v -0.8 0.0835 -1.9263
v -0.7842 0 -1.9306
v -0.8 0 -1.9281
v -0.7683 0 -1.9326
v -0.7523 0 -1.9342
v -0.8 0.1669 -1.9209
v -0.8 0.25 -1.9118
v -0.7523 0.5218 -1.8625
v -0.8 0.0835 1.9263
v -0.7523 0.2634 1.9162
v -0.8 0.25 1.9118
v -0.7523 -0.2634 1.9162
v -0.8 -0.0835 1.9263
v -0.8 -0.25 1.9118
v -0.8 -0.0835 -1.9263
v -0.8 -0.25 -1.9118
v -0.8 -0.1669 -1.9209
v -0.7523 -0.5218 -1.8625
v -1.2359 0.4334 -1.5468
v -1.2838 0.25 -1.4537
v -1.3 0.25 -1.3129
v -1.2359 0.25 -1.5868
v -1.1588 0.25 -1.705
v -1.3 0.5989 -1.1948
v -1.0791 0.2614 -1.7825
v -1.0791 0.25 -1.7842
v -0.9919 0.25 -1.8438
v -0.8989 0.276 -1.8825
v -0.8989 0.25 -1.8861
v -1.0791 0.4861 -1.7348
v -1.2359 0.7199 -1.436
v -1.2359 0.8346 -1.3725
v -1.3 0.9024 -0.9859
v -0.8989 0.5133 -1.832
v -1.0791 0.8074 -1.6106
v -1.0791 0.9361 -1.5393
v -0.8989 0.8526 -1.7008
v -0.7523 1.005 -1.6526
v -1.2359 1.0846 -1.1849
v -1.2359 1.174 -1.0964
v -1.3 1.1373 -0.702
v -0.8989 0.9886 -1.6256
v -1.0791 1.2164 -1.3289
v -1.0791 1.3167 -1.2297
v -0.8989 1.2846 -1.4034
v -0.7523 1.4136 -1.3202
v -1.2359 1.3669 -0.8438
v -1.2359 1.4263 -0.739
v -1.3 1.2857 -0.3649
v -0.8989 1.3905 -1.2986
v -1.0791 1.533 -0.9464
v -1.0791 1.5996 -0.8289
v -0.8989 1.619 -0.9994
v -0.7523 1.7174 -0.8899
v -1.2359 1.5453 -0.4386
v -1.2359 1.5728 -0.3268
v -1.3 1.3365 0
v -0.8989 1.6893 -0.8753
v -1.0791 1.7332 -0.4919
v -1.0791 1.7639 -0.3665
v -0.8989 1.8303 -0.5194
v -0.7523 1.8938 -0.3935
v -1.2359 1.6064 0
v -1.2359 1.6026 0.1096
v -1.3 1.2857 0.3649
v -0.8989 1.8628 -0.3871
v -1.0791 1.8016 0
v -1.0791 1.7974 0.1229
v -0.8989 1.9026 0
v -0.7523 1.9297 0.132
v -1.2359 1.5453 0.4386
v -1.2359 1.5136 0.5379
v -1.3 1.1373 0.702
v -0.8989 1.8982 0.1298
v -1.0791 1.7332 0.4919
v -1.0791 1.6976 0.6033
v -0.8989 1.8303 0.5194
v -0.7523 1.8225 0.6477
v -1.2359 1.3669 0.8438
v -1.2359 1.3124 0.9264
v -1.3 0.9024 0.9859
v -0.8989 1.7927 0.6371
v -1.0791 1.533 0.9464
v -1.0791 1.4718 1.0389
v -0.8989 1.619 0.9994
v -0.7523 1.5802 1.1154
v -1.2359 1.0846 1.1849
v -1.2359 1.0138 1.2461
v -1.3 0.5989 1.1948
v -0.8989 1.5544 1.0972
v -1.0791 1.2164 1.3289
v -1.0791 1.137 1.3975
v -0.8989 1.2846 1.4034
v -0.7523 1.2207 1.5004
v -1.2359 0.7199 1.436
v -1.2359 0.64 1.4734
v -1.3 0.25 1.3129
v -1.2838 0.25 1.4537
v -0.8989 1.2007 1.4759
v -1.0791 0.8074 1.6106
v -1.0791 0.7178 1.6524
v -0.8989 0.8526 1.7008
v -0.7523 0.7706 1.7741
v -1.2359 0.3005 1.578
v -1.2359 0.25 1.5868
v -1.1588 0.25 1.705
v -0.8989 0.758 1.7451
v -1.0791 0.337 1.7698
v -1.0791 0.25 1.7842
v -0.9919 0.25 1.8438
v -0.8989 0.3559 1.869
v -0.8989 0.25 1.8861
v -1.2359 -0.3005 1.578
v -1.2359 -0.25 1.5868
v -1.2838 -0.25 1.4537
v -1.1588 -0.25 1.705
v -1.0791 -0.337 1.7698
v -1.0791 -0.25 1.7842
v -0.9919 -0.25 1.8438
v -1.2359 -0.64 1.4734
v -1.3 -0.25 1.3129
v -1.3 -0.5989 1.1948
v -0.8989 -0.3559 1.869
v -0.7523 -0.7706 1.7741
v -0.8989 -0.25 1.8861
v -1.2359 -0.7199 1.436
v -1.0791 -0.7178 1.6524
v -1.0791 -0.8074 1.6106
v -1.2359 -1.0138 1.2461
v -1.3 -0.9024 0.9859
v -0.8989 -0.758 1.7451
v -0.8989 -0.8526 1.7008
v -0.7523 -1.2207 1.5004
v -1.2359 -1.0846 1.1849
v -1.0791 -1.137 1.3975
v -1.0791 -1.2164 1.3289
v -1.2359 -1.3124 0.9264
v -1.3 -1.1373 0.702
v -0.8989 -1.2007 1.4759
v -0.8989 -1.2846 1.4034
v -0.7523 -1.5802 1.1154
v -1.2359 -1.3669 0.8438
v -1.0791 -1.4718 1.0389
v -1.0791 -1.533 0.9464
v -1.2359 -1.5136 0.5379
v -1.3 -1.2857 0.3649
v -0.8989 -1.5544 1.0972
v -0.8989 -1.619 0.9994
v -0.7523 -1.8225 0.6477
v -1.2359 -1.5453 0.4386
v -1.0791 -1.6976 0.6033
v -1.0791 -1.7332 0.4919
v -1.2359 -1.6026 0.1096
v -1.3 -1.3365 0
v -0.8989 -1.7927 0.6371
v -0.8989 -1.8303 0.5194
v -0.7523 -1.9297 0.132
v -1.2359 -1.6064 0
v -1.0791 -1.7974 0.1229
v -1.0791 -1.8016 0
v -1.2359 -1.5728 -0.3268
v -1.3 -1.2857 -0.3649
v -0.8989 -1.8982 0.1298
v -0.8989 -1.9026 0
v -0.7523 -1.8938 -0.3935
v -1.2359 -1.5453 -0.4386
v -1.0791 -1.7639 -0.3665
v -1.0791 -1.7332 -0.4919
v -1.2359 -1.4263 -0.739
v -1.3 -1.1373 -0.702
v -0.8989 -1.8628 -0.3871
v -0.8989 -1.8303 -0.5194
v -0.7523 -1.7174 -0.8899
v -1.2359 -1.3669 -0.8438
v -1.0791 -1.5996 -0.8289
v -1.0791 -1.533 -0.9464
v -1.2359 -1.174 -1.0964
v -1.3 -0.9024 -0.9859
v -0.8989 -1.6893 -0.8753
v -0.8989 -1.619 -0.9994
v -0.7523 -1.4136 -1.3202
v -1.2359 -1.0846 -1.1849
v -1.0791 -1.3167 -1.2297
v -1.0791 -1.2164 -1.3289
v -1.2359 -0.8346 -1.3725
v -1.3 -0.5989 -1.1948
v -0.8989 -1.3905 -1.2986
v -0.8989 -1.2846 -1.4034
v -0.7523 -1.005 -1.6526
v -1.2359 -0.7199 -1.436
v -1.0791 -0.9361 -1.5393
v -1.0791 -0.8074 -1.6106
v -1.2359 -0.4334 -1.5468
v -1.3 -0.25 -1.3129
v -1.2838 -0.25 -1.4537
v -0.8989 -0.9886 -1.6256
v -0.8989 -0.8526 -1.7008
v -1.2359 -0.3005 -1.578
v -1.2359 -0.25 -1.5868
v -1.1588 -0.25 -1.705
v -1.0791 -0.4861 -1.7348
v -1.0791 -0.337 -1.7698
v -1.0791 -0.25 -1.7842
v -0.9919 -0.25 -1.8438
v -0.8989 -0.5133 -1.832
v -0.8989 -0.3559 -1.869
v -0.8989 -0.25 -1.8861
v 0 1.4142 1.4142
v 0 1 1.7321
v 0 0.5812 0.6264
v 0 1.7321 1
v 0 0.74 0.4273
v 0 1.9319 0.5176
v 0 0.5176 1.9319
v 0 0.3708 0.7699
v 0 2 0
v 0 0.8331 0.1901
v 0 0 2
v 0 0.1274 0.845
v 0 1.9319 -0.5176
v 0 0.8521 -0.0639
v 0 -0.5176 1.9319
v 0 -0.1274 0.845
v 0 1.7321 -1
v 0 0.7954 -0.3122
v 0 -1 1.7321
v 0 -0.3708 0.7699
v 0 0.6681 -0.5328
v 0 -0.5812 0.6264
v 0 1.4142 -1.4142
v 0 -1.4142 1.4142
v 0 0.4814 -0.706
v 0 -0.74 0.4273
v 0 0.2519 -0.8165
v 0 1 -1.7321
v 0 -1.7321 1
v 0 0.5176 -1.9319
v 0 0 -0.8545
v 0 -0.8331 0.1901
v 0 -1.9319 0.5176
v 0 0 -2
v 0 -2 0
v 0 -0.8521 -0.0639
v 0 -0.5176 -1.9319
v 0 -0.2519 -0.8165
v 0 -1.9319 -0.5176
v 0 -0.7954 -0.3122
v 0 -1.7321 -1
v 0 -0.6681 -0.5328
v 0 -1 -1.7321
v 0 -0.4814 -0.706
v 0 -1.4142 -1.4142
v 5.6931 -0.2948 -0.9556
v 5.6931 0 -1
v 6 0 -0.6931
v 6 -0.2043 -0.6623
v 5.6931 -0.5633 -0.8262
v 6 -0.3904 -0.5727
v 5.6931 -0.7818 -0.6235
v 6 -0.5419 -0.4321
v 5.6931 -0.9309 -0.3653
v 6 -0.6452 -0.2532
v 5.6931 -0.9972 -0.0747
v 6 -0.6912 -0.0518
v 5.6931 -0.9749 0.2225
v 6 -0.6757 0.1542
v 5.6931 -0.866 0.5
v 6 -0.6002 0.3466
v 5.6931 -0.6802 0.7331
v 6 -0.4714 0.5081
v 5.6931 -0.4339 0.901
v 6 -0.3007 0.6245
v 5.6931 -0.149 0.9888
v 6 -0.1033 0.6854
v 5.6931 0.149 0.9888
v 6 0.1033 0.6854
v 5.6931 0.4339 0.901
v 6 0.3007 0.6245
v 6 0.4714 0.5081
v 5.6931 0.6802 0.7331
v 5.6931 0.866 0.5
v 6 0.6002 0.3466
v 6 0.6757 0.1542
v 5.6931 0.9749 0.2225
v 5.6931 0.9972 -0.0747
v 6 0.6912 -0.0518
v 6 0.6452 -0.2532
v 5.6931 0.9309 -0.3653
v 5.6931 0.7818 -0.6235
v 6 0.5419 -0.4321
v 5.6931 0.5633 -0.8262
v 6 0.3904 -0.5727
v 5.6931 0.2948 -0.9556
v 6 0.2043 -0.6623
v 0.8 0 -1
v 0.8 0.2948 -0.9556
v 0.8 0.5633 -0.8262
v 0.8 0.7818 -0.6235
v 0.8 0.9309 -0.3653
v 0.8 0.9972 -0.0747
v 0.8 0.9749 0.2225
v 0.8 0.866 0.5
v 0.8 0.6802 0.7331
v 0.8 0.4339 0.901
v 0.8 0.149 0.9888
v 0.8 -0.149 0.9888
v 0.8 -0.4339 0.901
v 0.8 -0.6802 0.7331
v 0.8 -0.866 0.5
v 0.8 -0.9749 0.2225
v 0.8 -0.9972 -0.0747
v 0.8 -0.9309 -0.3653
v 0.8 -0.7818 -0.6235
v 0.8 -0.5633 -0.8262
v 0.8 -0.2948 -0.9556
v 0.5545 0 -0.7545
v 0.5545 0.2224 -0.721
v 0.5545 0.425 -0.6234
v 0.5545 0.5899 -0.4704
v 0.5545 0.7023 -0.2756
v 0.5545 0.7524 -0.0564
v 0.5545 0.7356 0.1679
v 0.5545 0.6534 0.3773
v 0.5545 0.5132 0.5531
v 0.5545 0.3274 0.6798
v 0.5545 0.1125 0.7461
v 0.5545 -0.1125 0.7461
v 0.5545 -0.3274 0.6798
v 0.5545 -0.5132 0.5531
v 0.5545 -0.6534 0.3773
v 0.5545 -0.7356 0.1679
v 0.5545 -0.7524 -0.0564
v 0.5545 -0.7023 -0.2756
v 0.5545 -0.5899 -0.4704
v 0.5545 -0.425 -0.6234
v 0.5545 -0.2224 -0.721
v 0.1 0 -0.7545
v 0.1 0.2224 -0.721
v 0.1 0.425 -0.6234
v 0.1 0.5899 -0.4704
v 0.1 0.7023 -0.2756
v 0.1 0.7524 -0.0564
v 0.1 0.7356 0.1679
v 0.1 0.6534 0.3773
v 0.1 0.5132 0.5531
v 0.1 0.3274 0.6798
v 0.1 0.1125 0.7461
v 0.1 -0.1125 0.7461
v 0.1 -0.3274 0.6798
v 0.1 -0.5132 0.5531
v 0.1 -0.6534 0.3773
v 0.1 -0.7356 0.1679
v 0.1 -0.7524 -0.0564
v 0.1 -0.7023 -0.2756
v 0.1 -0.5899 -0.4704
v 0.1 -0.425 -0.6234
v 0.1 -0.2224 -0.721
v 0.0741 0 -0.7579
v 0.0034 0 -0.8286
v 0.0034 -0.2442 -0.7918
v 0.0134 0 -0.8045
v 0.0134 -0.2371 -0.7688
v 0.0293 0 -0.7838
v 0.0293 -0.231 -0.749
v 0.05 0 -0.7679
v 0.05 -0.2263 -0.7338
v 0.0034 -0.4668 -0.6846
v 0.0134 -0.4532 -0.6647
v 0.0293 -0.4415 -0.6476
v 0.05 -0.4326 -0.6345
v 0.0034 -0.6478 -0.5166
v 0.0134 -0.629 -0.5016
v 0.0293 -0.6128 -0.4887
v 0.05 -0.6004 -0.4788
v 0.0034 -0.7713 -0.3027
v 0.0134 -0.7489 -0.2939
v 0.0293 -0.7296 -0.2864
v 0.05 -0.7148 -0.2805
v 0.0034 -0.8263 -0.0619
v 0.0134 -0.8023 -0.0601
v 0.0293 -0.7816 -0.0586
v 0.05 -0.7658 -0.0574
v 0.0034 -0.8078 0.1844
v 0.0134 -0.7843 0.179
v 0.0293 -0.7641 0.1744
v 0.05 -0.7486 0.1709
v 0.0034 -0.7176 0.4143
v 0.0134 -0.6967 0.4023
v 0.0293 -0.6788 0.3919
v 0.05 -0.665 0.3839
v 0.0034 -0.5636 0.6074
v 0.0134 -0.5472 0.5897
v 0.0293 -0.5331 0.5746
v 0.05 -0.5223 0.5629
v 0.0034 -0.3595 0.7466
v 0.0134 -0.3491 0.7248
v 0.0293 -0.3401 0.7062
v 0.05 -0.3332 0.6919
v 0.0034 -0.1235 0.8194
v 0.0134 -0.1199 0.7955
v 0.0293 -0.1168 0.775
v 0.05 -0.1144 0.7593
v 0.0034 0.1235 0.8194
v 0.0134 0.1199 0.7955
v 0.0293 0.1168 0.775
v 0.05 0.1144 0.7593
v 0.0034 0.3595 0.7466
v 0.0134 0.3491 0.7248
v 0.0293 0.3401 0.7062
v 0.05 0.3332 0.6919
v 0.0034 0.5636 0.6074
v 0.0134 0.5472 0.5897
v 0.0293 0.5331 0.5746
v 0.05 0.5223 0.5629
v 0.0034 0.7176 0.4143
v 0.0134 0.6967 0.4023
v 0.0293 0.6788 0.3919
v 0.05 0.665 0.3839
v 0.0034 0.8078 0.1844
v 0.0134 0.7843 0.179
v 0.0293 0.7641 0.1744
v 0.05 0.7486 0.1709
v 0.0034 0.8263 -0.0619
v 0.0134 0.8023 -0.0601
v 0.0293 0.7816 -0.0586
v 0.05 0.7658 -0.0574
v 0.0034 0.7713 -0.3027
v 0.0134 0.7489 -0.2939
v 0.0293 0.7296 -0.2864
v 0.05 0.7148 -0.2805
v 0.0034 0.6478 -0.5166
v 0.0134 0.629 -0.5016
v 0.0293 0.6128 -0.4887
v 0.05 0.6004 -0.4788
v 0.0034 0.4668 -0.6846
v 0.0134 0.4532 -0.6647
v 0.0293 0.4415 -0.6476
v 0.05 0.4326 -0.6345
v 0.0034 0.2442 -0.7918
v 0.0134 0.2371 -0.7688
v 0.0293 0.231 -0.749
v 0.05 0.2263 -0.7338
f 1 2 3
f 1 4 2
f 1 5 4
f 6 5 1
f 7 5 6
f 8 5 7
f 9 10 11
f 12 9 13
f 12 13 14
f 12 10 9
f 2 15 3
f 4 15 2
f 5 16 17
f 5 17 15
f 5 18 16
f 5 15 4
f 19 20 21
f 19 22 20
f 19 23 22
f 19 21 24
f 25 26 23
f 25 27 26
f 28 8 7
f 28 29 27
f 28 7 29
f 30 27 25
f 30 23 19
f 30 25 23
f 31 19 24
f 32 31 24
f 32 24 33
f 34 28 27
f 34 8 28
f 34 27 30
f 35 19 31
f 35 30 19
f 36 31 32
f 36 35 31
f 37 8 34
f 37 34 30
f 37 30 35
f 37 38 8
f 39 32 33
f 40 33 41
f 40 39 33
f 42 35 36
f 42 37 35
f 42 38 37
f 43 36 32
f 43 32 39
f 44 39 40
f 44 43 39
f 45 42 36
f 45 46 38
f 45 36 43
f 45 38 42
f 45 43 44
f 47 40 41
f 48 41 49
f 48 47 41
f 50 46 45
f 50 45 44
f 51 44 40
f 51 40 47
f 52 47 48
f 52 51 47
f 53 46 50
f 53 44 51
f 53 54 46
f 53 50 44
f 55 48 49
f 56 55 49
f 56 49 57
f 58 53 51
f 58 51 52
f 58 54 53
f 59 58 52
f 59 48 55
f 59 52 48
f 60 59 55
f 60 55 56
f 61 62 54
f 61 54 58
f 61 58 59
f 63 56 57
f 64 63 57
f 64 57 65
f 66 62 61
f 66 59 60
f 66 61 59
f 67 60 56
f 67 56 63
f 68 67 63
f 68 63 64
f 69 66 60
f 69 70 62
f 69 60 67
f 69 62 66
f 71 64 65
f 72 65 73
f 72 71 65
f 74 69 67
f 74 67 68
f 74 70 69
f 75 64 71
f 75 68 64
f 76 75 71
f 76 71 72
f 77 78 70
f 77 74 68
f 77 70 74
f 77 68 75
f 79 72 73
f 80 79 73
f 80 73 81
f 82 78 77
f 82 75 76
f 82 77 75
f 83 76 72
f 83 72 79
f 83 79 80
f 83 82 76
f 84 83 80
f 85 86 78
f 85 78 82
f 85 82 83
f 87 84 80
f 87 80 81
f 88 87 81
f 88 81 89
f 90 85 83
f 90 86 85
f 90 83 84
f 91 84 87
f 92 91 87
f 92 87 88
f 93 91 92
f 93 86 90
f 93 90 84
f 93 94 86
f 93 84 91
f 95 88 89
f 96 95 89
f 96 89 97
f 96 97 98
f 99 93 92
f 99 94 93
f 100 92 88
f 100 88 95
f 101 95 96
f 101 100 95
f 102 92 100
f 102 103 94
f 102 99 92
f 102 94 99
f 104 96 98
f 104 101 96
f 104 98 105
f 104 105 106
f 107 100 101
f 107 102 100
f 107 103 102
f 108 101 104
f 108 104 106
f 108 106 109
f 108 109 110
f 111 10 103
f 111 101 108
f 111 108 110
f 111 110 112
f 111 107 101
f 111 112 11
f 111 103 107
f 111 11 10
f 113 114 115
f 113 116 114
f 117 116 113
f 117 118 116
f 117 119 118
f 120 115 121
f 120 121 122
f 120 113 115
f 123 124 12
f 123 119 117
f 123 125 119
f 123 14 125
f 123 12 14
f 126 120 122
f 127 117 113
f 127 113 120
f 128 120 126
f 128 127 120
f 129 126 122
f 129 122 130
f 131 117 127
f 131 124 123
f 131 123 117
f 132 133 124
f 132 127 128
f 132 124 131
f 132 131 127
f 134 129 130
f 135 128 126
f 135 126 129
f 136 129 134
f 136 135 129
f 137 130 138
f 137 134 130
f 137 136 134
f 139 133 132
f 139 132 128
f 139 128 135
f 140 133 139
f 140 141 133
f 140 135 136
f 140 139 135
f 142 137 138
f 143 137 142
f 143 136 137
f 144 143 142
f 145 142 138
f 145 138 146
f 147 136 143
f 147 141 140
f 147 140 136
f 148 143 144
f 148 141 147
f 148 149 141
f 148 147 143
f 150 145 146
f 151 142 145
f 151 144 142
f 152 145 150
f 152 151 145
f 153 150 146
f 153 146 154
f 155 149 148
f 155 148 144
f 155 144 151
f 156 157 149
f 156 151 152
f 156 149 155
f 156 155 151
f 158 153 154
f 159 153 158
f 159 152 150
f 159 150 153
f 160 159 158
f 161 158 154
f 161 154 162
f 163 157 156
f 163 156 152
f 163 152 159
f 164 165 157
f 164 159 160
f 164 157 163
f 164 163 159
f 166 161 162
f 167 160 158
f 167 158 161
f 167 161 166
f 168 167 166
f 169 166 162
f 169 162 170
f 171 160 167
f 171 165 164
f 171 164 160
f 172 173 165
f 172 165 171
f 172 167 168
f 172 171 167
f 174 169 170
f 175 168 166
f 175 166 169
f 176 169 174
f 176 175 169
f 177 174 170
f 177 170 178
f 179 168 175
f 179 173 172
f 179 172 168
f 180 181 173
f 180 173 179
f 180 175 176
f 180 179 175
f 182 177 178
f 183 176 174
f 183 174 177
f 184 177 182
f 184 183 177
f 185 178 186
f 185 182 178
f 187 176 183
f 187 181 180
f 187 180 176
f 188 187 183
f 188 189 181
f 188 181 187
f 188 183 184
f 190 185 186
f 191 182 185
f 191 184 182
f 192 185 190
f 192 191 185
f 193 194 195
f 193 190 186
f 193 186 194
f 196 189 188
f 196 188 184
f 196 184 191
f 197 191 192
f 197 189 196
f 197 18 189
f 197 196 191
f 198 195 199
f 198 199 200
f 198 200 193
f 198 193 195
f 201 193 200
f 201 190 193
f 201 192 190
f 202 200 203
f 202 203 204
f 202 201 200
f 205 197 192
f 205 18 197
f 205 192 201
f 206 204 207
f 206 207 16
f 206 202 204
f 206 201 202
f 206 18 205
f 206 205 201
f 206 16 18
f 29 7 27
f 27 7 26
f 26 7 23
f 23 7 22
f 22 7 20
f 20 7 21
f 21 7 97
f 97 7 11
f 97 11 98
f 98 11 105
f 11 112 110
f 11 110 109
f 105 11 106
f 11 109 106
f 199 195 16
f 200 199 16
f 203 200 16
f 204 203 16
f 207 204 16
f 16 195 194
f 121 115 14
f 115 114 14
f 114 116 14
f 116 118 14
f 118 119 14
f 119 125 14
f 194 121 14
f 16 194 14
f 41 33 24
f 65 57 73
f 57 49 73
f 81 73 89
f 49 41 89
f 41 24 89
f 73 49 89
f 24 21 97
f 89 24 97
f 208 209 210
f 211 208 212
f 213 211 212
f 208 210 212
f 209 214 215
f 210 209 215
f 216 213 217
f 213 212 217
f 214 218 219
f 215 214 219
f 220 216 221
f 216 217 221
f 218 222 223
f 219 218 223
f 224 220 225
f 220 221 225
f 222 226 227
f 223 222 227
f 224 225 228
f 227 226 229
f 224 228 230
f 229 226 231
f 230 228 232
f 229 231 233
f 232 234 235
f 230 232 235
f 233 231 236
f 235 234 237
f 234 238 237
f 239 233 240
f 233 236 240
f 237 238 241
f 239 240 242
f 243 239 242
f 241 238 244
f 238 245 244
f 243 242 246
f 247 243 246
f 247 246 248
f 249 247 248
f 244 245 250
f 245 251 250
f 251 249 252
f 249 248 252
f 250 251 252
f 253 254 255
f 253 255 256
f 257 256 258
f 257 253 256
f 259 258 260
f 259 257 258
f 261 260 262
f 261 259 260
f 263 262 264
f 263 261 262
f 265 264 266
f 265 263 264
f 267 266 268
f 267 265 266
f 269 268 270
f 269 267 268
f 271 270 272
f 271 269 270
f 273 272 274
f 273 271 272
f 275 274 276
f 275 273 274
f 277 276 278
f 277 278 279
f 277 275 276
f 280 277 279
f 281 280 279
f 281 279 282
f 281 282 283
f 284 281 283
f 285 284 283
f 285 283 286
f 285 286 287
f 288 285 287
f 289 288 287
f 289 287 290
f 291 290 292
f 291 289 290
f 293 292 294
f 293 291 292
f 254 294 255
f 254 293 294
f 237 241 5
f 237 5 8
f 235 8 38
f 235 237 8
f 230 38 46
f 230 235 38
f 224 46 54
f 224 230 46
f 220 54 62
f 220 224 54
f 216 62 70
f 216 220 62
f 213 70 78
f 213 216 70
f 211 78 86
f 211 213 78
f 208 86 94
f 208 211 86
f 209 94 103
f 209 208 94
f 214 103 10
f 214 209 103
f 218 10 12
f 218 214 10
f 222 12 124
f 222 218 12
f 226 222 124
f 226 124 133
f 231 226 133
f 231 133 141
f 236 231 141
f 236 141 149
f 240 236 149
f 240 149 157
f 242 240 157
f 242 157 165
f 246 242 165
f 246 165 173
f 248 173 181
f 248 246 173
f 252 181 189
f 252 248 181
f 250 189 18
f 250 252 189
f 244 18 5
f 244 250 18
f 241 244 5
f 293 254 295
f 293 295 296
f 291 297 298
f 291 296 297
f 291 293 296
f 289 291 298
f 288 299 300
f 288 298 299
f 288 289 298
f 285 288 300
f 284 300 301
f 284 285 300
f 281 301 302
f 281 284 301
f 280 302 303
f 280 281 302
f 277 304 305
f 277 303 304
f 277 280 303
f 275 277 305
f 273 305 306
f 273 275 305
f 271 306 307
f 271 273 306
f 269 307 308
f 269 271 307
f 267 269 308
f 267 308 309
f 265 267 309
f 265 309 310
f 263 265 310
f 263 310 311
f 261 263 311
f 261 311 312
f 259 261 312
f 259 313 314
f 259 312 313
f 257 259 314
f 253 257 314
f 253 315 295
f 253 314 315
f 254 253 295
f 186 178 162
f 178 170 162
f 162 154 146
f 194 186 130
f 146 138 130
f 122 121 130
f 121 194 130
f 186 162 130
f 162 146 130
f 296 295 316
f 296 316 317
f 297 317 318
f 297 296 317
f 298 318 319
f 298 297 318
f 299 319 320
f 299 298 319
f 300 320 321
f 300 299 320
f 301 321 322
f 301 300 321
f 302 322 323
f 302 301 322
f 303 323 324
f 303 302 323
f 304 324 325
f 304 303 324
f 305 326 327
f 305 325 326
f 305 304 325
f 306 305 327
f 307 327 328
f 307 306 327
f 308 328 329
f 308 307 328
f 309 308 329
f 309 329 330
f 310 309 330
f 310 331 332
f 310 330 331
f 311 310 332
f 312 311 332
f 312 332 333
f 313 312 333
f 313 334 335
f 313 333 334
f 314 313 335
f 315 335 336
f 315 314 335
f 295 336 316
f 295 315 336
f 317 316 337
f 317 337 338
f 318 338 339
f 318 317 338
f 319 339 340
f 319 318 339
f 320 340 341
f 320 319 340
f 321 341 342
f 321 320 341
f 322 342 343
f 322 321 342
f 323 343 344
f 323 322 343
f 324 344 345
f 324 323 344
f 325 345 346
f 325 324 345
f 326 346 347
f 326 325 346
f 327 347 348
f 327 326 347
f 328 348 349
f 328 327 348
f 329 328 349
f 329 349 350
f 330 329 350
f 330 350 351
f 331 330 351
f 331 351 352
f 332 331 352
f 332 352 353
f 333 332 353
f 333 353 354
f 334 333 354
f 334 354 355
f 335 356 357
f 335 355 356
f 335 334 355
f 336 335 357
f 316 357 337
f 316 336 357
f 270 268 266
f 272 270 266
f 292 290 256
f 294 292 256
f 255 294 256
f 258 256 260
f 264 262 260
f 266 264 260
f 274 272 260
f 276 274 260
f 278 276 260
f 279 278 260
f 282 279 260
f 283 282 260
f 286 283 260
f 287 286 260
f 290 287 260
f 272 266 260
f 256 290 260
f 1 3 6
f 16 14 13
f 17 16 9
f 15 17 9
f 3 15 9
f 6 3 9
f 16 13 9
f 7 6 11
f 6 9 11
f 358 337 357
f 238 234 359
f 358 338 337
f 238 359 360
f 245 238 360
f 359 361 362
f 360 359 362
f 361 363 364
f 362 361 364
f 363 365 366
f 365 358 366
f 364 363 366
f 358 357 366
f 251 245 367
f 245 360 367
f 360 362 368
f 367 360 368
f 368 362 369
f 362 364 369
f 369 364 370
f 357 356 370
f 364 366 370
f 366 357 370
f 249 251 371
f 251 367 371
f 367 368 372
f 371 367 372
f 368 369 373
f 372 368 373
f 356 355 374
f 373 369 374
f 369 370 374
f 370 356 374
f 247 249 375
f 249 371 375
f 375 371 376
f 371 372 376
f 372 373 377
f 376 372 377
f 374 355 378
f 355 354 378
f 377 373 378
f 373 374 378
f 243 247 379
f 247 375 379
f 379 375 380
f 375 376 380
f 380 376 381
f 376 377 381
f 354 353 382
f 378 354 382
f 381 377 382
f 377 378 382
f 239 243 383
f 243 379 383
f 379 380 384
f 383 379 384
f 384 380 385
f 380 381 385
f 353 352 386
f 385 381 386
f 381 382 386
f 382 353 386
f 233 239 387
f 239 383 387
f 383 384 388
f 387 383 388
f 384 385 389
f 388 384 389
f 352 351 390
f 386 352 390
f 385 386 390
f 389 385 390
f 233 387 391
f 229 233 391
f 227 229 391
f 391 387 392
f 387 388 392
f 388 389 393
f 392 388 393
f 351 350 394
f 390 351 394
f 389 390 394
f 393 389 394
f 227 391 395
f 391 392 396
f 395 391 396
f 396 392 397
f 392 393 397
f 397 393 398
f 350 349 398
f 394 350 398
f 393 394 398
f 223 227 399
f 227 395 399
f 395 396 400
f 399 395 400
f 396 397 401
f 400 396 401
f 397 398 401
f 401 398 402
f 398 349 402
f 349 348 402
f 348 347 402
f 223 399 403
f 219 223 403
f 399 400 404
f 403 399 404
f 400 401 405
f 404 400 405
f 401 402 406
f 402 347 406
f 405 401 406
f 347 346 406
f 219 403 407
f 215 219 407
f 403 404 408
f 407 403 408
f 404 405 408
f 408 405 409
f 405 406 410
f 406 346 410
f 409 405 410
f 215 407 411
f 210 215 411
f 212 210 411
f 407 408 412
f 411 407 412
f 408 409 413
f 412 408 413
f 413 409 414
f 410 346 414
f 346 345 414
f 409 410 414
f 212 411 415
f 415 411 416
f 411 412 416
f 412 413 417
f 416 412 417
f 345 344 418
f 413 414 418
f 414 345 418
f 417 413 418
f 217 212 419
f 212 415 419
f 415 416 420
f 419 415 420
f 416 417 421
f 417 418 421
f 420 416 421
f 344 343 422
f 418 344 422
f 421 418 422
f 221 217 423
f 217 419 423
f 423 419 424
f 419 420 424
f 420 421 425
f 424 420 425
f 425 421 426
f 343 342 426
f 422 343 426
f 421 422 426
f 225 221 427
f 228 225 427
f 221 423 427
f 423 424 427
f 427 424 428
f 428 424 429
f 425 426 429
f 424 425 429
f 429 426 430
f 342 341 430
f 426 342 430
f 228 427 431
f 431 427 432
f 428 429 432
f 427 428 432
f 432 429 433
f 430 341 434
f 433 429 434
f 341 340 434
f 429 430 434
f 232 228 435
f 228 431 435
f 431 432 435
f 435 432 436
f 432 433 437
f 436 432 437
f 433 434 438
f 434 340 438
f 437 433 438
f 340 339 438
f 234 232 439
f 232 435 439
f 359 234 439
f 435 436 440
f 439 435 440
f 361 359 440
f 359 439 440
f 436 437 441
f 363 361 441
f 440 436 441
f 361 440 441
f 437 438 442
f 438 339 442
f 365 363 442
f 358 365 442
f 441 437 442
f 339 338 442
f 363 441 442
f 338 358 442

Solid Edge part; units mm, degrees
sketch "Sketch1" plane through (0, 0, 0) normal (0, -1, 0) x (1, 0, 0)
  line L0 (-1.3, 0) -> (-1.3, -1.3365)
  arc A0 (-1.3, -1.3365) -> (-0.7523, -1.9342) centre (-0.7, -1.3365) ccw
  line L1 (-0.7523, -1.9342) -> (0, -2)
  line L2 (0, -2) -> (0, -0.8545)
  arc A1 (0, -0.8545) -> (0.1, -0.7545) centre (0.1, -0.8545) cw
  line L3 (0.1, -0.7545) -> (0.5545, -0.7545)
  line L4 (0.5545, -0.7545) -> (0.8, -1)
  line L5 (0.8, -1) -> (5.6931, -1)
  line L6 (5.6931, -1) -> (6, -0.6931)
  line L7 (6, -0.6931) -> (6, 0)
  line L8 (6, 0) -> (-1.3, 0)
revolve "RevolvedProtrusion1" add sketch "Sketch1" angle 360 about axis through (6, 0, 0) along (-1, 0, 0)
sketch "Sketch2" plane through (0, 0, 0) normal (0, 0, 1) x (1, 0, 0)
  line L0 (-2.3, 0.25) -> (-2.3, -0.25)
  line L1 (-2.3, -0.25) -> (-0.8, -0.25)
  line L2 (-0.8, -0.25) -> (-0.8, 0.25)
  line L3 (-0.8, 0.25) -> (-2.3, 0.25)
extrude "ExtrudedCutout_1" cut sketch "Sketch2" against normal blind 2.6 and the other way blind 2.6
properties part number "bene_inox_210211-2X6"
